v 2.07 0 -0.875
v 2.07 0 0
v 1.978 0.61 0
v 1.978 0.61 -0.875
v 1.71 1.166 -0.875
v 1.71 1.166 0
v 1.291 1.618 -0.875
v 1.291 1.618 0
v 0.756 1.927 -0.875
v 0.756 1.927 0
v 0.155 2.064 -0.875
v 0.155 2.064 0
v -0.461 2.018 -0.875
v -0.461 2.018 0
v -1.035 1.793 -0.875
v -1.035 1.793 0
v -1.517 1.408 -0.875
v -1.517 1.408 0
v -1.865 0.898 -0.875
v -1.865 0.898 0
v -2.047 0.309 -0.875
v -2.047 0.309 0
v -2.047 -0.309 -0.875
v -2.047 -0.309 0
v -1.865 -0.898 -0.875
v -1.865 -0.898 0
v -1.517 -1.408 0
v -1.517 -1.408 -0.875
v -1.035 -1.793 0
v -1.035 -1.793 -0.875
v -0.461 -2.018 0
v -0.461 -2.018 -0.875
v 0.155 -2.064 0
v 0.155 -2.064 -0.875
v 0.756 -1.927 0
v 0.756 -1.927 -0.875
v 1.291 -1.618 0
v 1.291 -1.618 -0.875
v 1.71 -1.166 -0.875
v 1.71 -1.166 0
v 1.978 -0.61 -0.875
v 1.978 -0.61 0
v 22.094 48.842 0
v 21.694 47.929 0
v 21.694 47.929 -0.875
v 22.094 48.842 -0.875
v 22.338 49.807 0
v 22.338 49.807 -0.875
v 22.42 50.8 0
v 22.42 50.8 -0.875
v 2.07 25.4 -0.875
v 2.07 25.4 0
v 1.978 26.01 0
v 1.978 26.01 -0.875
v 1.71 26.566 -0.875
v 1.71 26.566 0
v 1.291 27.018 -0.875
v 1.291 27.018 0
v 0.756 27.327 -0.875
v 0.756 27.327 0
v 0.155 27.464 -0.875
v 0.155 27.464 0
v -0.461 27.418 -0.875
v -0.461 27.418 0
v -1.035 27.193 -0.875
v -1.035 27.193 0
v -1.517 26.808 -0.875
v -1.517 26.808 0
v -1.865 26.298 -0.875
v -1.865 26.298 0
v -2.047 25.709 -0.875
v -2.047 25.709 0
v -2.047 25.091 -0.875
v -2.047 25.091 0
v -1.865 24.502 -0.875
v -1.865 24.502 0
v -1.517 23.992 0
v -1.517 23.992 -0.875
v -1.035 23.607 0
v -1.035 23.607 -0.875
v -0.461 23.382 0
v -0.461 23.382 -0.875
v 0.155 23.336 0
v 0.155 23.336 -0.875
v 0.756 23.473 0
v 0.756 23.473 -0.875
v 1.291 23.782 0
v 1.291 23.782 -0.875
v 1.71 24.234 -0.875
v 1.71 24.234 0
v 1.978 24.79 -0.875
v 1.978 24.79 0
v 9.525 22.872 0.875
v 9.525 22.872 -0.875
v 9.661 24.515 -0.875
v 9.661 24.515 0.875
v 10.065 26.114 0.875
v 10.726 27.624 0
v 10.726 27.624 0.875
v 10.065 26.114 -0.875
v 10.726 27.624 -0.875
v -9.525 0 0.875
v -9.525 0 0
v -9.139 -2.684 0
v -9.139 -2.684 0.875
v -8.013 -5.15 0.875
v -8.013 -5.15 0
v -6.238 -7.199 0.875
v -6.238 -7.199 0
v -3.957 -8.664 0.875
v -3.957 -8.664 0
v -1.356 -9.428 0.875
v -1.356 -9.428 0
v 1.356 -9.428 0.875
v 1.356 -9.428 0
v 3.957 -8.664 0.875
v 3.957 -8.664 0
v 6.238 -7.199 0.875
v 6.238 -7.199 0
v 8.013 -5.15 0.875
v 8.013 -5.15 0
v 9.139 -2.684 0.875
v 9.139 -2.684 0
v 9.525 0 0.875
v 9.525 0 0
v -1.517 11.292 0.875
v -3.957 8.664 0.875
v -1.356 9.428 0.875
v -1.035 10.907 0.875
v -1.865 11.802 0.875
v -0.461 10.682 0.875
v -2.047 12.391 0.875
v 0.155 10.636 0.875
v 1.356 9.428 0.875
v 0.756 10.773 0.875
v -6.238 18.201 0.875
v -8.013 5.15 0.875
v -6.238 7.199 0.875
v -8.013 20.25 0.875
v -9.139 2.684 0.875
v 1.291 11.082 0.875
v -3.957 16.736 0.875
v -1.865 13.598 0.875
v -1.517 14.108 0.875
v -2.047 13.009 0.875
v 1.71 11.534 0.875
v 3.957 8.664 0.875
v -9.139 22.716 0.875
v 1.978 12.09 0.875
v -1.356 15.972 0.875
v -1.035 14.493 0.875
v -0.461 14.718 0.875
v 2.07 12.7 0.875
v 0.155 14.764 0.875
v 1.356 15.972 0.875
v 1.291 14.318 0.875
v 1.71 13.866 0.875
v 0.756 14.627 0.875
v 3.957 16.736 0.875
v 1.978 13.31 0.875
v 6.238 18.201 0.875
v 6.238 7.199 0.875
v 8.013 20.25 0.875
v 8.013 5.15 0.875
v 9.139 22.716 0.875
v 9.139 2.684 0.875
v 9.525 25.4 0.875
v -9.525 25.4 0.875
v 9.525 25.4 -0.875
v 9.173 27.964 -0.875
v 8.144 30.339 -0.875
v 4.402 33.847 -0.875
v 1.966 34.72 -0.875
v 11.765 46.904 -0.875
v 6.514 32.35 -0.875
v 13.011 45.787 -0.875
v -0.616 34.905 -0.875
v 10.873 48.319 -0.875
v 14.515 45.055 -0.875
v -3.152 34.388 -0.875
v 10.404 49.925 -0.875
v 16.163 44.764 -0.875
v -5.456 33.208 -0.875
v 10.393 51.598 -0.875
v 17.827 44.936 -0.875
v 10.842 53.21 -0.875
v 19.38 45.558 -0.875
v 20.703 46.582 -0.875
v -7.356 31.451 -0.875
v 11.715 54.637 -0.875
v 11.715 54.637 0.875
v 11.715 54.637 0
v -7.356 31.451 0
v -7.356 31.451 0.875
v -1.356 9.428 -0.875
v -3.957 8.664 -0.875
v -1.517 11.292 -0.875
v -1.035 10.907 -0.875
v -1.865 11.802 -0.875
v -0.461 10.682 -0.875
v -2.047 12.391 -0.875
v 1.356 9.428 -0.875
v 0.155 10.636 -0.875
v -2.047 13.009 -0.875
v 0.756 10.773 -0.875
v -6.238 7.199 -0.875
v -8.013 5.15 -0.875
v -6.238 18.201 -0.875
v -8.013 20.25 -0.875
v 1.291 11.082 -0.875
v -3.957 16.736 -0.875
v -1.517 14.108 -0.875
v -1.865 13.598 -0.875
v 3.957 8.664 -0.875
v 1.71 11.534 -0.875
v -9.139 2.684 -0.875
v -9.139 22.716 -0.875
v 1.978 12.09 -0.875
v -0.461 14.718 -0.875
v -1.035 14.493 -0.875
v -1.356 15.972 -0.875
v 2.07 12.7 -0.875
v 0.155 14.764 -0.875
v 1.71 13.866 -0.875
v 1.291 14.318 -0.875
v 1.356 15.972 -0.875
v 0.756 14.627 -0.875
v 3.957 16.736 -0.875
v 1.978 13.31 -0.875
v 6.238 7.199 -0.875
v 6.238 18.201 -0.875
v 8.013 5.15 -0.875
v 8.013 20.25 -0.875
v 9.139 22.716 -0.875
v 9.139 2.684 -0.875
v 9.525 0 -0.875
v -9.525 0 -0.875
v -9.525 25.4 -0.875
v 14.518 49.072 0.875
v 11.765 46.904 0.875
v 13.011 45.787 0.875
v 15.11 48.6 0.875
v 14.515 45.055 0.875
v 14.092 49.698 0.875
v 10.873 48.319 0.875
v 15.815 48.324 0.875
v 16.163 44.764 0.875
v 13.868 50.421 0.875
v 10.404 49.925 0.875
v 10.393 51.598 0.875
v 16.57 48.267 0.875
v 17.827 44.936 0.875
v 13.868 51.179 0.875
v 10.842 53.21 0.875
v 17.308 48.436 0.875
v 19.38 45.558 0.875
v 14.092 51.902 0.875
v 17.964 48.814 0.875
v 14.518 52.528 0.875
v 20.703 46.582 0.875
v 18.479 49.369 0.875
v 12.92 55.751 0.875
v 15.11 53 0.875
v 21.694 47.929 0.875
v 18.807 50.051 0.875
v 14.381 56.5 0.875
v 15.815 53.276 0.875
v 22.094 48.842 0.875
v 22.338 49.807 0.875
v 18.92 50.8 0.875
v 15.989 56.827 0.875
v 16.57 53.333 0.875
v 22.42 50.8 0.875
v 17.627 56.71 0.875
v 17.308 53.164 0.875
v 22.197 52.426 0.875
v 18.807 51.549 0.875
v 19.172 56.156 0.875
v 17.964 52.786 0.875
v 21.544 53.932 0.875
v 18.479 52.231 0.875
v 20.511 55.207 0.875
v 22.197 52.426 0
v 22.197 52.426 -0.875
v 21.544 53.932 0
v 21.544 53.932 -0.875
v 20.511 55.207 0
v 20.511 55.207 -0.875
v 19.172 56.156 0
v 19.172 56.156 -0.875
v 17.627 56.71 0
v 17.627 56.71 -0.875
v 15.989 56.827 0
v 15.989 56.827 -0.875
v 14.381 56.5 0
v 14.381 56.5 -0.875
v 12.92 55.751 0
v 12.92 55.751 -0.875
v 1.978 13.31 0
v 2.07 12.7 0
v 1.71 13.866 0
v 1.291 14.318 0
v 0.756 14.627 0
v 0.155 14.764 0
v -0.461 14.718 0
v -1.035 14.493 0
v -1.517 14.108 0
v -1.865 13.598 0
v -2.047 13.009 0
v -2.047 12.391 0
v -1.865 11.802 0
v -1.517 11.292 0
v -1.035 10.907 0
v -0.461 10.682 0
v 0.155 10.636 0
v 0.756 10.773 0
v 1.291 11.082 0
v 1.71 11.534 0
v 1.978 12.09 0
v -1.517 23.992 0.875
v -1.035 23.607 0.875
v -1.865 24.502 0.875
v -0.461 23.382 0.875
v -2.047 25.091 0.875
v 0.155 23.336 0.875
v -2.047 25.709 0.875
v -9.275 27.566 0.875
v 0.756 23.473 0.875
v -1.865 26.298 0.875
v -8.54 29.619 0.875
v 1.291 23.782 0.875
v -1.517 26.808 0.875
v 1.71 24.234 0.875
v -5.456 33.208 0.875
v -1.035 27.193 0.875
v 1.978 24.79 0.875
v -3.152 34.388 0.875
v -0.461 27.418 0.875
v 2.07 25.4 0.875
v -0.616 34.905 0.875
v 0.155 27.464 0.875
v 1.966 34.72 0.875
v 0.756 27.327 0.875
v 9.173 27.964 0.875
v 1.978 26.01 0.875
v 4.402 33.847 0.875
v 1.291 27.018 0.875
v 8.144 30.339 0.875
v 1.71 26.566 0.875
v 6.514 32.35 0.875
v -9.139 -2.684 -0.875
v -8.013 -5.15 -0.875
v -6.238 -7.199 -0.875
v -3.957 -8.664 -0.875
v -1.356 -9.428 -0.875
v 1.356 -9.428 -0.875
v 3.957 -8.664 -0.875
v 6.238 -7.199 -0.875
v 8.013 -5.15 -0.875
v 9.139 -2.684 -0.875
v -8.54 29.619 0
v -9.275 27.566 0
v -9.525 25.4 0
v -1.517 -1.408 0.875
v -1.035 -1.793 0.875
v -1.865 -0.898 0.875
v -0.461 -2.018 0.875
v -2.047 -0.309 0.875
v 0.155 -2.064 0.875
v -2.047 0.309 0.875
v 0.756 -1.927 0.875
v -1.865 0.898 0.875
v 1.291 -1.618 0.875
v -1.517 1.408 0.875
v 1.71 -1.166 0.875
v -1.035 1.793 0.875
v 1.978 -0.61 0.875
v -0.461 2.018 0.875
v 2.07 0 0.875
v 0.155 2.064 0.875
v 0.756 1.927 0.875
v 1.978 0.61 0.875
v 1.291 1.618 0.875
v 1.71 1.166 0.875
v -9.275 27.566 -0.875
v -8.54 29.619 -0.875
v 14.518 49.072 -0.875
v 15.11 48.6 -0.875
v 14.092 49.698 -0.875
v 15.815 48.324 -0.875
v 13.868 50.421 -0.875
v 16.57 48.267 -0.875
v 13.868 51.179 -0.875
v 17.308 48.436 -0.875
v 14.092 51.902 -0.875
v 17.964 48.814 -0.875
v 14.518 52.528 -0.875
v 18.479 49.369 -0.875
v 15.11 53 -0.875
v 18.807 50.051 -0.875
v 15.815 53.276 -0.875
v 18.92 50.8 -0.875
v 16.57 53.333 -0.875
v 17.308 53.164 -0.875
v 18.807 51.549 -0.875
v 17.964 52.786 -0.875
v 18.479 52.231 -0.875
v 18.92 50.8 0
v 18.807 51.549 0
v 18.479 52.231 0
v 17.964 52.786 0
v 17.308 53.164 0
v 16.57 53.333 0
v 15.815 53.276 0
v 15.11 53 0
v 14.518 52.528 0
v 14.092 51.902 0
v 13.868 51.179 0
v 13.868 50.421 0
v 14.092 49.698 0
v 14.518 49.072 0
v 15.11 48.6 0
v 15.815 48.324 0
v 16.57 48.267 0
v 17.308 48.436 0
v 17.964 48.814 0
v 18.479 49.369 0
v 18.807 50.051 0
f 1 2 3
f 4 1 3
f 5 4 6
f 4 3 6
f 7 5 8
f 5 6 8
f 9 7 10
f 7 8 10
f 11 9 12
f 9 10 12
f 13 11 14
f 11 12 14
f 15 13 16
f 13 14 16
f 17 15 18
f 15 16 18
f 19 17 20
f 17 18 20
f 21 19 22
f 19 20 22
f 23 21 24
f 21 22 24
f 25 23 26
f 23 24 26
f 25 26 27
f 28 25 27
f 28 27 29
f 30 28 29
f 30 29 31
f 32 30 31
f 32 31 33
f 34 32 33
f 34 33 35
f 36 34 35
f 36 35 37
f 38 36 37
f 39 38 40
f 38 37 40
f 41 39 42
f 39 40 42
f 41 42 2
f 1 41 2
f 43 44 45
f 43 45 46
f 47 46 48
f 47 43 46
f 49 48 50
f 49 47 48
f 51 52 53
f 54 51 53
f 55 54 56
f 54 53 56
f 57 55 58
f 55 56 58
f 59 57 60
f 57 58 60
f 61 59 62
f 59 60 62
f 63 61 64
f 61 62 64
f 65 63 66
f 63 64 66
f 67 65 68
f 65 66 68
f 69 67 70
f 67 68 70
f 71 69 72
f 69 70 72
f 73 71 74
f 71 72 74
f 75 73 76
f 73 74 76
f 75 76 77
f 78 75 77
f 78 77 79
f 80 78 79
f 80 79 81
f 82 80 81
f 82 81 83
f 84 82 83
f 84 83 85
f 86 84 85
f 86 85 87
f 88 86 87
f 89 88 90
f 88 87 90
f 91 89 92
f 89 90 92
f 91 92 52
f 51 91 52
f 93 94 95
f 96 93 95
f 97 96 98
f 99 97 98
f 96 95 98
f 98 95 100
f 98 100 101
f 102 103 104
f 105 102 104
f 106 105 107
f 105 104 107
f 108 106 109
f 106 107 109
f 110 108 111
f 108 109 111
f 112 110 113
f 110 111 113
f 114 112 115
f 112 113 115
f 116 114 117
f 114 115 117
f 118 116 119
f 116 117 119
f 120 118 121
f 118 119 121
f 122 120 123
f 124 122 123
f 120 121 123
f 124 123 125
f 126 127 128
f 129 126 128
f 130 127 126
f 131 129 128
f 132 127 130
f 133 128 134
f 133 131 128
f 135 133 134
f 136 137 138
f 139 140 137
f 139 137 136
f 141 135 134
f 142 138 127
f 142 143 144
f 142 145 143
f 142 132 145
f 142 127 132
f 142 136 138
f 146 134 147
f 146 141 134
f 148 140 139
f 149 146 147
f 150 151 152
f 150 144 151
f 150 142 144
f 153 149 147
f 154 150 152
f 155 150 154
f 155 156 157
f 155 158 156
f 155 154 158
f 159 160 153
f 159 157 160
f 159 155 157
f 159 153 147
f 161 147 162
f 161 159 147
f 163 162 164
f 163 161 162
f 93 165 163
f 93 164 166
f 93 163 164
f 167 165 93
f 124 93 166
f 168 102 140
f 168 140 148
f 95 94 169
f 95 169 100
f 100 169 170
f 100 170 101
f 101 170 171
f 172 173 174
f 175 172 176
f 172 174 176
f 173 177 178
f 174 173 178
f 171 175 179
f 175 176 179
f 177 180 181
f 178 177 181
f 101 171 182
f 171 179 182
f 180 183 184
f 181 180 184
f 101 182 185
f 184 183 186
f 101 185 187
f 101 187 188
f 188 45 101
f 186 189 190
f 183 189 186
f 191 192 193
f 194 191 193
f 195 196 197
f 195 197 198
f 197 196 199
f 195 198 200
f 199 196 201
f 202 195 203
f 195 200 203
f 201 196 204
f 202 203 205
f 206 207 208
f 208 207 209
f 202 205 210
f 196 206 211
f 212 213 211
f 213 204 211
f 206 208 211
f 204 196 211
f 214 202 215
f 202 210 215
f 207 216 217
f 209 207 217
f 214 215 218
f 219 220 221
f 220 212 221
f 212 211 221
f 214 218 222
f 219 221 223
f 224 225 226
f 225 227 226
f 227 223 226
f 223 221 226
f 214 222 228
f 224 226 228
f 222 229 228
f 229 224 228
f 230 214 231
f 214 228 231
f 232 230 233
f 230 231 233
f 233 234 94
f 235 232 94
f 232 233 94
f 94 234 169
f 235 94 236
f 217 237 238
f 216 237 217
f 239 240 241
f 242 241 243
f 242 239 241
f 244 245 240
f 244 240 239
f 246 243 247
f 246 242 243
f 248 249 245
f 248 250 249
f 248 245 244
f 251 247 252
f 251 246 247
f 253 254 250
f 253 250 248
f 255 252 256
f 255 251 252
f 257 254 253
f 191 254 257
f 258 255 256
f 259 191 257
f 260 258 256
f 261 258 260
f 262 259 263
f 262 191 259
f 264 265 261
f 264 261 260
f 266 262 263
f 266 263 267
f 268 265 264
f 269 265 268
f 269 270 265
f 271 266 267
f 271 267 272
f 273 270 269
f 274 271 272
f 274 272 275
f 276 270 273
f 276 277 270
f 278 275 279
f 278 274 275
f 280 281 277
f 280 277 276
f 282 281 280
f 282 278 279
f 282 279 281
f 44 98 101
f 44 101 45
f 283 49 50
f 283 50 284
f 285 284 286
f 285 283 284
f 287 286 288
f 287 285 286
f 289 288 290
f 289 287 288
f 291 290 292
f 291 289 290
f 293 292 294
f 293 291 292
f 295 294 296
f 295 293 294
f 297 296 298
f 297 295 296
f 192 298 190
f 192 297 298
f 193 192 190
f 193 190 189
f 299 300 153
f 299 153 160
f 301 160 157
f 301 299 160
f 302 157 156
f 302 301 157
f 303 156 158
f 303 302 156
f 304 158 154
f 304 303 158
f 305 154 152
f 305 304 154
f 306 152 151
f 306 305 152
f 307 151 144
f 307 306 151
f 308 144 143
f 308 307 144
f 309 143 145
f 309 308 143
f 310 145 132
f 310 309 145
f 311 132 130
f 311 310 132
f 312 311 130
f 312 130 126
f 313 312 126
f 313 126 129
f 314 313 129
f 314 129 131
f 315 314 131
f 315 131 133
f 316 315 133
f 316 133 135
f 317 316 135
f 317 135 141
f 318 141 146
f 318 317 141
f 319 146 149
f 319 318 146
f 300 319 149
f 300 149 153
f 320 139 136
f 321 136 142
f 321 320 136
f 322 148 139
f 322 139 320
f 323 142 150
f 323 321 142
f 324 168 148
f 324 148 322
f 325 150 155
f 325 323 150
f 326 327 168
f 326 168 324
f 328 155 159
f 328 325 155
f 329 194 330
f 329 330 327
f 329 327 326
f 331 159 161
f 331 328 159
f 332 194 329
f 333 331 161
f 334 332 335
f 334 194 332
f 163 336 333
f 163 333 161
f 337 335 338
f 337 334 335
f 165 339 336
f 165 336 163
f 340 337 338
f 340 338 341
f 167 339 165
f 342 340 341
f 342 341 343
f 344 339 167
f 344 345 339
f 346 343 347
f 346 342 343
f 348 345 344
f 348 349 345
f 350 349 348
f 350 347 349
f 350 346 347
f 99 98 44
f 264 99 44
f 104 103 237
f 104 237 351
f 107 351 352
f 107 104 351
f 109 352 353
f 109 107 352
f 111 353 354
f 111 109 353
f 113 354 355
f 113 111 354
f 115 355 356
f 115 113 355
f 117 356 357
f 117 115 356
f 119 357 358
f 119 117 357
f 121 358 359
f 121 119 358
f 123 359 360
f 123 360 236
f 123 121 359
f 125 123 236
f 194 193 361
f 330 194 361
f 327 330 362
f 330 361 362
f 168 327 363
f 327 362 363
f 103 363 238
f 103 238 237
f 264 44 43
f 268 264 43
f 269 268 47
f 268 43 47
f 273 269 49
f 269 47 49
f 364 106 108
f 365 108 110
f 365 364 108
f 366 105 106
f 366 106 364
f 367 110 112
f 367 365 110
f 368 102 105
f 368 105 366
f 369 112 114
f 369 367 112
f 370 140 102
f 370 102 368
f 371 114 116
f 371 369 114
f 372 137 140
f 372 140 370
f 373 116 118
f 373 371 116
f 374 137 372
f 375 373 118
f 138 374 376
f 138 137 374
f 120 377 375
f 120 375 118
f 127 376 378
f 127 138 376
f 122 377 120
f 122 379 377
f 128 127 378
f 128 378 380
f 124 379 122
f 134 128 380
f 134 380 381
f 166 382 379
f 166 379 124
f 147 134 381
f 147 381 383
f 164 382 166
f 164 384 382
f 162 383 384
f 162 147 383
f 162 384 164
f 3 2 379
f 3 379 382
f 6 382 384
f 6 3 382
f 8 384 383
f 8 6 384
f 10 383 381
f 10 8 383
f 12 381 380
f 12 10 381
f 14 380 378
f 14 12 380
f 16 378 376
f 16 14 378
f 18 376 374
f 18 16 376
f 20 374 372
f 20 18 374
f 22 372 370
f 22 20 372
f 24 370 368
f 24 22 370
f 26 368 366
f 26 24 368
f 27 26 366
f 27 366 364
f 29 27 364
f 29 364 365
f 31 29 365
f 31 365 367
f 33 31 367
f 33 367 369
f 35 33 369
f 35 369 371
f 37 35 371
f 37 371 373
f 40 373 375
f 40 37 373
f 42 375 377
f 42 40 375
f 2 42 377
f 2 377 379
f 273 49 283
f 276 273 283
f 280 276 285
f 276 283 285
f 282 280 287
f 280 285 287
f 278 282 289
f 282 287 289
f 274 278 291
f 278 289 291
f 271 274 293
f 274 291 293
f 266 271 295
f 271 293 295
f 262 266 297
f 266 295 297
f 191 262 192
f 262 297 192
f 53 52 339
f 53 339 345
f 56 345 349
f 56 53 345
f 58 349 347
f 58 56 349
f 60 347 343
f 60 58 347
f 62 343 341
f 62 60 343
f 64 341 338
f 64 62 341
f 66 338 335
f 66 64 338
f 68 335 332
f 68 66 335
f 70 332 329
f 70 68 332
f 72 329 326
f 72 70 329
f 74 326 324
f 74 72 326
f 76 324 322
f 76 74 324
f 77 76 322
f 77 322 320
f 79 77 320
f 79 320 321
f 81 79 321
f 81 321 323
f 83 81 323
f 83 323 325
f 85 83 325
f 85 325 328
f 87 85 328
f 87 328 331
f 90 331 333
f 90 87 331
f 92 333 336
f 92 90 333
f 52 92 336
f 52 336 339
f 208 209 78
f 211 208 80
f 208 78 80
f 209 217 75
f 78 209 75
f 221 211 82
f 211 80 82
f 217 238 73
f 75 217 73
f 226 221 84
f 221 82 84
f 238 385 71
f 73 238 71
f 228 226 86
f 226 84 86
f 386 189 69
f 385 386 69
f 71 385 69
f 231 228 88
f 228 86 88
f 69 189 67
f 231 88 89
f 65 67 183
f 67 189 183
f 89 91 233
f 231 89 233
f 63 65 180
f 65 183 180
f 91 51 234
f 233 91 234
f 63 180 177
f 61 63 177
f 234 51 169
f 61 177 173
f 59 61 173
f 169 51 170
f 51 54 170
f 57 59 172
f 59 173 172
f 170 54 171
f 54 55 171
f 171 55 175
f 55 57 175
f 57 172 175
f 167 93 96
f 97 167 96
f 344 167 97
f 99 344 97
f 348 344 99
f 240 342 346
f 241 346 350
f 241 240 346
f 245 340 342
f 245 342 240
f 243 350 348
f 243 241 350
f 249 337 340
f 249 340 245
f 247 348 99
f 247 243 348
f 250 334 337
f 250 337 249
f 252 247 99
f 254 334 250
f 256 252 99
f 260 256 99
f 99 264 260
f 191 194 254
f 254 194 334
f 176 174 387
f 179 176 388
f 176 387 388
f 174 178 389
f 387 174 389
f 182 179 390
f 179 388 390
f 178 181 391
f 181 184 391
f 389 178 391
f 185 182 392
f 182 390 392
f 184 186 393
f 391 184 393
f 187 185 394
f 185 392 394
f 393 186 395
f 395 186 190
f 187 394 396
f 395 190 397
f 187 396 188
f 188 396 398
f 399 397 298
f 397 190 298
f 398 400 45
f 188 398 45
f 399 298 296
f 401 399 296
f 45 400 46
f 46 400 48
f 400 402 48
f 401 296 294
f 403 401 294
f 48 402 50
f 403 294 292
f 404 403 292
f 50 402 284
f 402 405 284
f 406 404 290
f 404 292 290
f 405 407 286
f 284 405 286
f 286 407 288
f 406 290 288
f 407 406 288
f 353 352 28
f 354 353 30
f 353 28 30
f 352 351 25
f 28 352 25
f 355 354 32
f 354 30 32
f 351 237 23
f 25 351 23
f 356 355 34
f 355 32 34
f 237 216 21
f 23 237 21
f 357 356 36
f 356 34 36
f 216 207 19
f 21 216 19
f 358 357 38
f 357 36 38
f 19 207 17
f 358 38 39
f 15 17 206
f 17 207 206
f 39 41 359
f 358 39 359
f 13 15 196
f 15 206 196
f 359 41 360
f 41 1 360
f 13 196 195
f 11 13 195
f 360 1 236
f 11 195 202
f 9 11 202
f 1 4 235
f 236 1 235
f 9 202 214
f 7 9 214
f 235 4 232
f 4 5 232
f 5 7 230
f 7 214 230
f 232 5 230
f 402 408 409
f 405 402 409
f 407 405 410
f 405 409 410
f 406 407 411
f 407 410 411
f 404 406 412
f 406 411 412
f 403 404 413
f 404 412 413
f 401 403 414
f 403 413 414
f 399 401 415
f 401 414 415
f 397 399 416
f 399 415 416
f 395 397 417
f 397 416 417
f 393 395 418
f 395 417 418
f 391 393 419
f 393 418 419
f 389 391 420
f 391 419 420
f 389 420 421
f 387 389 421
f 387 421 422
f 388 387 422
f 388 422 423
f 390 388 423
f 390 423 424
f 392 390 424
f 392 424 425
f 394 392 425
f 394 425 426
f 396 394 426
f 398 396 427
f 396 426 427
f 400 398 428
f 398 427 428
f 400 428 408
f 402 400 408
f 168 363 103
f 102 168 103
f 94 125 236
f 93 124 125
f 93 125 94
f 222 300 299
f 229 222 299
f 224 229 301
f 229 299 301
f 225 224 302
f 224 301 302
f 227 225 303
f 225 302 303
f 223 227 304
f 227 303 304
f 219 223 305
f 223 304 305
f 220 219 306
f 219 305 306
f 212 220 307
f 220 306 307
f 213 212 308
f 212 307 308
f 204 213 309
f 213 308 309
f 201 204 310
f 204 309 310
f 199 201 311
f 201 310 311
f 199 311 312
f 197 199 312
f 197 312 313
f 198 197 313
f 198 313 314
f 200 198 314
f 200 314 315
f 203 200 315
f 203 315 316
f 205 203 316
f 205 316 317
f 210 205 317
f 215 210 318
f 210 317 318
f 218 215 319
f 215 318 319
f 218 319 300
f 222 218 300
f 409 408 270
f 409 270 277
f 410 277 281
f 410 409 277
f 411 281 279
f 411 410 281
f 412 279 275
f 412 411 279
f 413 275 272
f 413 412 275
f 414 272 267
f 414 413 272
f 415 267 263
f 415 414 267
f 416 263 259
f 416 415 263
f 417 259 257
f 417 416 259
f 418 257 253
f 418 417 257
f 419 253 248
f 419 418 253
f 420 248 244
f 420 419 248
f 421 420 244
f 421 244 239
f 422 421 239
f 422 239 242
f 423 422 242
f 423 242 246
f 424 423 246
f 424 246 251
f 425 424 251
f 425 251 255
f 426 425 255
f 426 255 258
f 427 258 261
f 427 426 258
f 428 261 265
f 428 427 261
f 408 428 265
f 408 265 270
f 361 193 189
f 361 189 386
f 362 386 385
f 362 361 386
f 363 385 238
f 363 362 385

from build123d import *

# Parameters (mm, degrees)
SKETCH1_R           = 6.04
SKETCH1_R_2         = 2.54
SKETCH1_R_3         = 9.525
SKETCH1_R_4         = 2.07
BOSS_EXTRUDE1_DEPTH = 0.875
FILLET2_R           = 10


with BuildPart() as part:
    # Sketch1 → Boss-Extrude1 (new, symmetric)
    # profile 1 of 5: a face of its own
    with BuildSketch(Plane.XY):
        with Locations((16.38, 50.8)):
            Circle(SKETCH1_R)
        with Locations((16.38, 50.8)):
            Circle(SKETCH1_R_2, mode=Mode.SUBTRACT)
    # profile 2 of 5: a face of its own
    with BuildSketch(Plane.XY):
        with Locations((0, 25.4)):
            Circle(SKETCH1_R_3)
        with Locations((0, 25.4)):
            Circle(SKETCH1_R_4, mode=Mode.SUBTRACT)
    # profile 3 of 5: a face of its own
    with BuildSketch(Plane.XY):
        with BuildLine():
            ThreePointArc((-7.356213705, 31.450763995), (3.213852008, 34.366425167), (9.525, 25.4))
            Line((9.525, 25.4), (21.694295801, 47.929484342))
            ThreePointArc((21.694295801, 47.929484342), (13.010594873, 45.787145615), (11.715272359, 54.636914912))
            Line((11.715272359, 54.636914912), (-7.356213705, 31.450763995))
        make_face()
    # profile 4 of 5: a face of its own
    with BuildSketch(Plane.XY):
        with BuildLine():
            Line((9.525, 0), (9.525, 25.4))
            ThreePointArc((9.525, 25.4), (0, 15.875), (-9.525, 25.4))
            Line((-9.525, 25.4), (-9.525, 0))
            ThreePointArc((-9.525, 0), (0, 9.525), (9.525, 0))
        make_face()
        with Locations((0, 12.7)):
            Circle(SKETCH1_R_4, mode=Mode.SUBTRACT)
    # profile 5 of 5: a face of its own
    with BuildSketch(Plane.XY):
        Circle(SKETCH1_R_3)
        Circle(SKETCH1_R_4, mode=Mode.SUBTRACT)
    extrude(amount=BOSS_EXTRUDE1_DEPTH, both=True)

    # Fillet2
    fillet2_edges = [part.edges().sort_by_distance(p)[0] for p in [
        (9.525, 25.4, 0),
    ]]
    fillet(fillet2_edges, radius=FILLET2_R)


solid = part.part
